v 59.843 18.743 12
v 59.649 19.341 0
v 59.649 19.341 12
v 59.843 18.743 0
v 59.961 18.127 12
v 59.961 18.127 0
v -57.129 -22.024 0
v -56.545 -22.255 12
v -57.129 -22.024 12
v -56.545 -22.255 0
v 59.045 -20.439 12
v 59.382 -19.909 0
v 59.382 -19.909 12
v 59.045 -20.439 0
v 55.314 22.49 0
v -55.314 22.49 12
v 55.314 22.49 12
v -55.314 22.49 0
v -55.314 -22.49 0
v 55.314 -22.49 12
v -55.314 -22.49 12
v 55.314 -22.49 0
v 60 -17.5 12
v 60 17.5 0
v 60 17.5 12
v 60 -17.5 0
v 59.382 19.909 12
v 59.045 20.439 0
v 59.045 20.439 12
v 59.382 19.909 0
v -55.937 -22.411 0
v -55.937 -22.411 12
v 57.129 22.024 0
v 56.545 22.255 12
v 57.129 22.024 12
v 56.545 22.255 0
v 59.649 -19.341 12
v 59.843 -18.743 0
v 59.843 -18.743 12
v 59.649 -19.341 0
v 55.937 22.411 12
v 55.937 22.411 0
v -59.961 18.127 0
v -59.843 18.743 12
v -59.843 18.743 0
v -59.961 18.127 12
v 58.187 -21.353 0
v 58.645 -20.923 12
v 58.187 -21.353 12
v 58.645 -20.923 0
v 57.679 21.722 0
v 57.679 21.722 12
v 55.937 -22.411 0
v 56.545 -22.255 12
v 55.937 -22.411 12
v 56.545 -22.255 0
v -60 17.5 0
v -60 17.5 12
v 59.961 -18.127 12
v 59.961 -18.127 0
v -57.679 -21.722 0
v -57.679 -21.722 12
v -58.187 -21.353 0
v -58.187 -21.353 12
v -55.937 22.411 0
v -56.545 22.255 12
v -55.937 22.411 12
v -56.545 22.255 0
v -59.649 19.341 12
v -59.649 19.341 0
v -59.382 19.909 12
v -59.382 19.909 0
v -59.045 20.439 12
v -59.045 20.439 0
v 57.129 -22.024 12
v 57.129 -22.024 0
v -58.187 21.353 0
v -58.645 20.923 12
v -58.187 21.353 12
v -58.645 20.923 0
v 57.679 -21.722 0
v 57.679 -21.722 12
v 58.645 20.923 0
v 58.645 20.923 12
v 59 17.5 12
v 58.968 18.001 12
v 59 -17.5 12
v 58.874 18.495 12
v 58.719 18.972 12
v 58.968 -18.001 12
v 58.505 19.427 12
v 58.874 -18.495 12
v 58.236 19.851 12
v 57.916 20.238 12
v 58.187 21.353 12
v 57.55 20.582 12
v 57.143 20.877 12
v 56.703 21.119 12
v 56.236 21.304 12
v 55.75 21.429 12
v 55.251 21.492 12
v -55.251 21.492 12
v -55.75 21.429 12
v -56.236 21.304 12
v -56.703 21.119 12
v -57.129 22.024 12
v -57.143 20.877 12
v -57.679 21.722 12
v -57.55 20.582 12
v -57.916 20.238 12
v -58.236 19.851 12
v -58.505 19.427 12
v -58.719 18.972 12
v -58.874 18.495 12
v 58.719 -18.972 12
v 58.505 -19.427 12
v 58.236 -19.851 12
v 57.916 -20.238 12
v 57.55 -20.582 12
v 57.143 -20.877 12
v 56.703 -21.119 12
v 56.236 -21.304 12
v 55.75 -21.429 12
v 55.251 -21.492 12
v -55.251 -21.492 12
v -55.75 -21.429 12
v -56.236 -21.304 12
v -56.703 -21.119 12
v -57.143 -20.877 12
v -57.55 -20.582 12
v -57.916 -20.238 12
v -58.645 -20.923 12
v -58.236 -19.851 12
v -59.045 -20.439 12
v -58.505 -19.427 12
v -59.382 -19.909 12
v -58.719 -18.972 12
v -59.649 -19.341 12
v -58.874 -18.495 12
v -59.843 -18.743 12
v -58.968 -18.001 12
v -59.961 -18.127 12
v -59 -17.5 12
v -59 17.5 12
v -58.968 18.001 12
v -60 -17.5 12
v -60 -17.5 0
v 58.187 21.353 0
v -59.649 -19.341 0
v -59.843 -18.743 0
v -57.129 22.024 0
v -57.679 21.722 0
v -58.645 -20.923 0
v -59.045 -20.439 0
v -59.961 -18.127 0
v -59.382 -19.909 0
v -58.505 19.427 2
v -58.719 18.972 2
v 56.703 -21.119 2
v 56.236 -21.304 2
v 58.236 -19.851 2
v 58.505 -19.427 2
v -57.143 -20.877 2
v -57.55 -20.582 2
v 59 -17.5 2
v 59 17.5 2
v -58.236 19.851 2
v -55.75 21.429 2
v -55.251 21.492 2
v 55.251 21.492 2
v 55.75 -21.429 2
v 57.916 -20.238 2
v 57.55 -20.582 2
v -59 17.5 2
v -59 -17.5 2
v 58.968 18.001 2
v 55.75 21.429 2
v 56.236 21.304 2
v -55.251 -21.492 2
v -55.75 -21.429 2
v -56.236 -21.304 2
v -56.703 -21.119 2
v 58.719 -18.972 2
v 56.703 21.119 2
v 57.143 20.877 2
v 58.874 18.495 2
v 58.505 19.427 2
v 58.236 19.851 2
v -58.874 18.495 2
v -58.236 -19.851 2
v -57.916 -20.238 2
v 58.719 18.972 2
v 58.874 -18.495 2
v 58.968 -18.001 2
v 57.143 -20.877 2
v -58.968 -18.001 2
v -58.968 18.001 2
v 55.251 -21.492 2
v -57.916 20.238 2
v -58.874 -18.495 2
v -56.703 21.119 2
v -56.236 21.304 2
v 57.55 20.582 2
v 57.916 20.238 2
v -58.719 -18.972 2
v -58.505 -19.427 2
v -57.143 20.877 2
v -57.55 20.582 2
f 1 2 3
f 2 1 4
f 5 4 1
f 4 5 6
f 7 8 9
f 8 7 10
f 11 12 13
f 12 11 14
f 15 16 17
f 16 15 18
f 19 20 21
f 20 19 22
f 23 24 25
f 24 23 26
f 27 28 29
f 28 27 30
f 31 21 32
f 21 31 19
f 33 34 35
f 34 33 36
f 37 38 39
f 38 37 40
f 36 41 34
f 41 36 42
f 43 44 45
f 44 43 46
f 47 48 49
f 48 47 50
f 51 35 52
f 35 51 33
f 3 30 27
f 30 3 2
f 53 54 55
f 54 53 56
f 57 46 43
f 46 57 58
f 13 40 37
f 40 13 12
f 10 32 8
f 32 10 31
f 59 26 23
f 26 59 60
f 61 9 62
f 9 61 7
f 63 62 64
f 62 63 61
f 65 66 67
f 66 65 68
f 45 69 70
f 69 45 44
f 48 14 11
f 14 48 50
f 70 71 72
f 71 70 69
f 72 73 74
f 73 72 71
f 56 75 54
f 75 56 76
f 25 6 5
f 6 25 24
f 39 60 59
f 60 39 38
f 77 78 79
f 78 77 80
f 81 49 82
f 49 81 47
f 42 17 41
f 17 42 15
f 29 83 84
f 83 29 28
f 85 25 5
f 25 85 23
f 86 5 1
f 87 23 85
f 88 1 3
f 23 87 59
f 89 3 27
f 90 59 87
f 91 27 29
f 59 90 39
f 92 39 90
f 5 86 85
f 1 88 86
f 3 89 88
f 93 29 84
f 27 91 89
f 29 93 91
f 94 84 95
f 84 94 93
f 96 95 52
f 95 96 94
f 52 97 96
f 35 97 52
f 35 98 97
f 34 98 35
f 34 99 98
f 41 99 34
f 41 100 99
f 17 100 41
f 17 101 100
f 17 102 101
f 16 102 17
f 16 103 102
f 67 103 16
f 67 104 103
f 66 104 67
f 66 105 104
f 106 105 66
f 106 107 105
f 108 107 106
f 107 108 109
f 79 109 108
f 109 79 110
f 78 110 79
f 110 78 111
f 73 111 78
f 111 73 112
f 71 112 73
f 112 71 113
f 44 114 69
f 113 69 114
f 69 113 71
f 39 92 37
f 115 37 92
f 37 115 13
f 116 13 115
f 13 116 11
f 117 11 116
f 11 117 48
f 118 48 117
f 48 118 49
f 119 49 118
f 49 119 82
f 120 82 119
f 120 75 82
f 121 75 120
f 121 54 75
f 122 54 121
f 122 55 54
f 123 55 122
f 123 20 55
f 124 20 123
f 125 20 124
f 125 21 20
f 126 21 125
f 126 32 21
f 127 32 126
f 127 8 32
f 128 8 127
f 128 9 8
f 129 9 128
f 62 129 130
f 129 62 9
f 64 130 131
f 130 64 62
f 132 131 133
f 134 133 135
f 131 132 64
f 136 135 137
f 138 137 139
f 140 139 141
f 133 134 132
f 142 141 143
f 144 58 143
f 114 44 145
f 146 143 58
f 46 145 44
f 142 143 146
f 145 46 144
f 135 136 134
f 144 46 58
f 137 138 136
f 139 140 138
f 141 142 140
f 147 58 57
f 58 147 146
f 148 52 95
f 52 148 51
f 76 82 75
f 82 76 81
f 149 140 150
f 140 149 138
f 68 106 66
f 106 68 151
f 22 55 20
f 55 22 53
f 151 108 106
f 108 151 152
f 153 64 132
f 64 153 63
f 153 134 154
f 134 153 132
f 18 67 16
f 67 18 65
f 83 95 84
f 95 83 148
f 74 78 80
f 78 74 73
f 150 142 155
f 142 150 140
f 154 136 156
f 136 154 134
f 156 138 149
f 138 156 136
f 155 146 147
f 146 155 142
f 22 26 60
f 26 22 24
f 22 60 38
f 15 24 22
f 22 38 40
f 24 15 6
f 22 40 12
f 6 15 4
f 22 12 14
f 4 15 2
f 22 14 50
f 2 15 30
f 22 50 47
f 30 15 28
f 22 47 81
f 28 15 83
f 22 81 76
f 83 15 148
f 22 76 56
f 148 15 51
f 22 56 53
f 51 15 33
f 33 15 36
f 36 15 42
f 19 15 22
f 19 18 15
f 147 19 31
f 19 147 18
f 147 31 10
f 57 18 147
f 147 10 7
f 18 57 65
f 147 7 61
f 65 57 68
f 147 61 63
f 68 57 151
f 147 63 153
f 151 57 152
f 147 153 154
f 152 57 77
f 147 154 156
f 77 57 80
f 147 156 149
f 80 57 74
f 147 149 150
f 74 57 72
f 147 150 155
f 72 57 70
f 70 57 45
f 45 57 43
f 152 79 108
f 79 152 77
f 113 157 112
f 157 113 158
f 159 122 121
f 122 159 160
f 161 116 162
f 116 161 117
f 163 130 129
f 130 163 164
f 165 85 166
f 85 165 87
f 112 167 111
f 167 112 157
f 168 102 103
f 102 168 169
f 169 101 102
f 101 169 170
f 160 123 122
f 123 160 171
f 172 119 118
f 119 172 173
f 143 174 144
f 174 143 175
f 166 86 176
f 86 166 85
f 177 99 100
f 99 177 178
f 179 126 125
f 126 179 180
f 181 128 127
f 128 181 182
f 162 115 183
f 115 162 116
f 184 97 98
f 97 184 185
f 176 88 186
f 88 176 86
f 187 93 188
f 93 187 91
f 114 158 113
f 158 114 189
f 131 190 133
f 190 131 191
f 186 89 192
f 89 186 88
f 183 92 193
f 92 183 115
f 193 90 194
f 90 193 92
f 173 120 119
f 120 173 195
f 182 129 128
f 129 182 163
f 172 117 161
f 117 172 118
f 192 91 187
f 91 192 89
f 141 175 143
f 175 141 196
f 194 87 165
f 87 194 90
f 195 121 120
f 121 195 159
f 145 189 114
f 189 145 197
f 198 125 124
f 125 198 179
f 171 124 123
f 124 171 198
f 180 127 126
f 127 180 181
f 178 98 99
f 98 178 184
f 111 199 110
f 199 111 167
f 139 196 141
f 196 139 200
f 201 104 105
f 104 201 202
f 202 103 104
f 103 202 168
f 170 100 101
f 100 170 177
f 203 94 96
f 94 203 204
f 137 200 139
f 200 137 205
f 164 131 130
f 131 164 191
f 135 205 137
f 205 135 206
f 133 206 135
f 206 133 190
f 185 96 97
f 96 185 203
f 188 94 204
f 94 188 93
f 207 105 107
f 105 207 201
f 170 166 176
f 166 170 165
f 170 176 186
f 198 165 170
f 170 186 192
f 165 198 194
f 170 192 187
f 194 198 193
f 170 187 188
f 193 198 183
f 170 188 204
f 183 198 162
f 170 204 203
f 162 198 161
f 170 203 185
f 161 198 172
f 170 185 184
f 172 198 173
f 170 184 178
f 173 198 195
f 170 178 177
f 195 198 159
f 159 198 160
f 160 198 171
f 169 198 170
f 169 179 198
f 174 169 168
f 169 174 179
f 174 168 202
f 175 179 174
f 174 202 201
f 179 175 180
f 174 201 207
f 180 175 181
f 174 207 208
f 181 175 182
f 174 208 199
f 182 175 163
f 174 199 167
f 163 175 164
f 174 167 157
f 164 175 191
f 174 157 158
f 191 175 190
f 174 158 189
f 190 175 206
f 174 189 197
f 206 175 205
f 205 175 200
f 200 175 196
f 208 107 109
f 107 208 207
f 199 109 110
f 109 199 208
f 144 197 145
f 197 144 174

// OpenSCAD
$fn = 50;


difference() {
	union() {
		hull() {
			translate(v = [-55.0000000000, 17.5000000000, 0]) {
				cylinder(h = 12, r = 5);
			}
			translate(v = [55.0000000000, 17.5000000000, 0]) {
				cylinder(h = 12, r = 5);
			}
			translate(v = [-55.0000000000, -17.5000000000, 0]) {
				cylinder(h = 12, r = 5);
			}
			translate(v = [55.0000000000, -17.5000000000, 0]) {
				cylinder(h = 12, r = 5);
			}
		}
	}
	union() {
		translate(v = [0, 0, 2]) {
			hull() {
				translate(v = [-55.0000000000, 17.5000000000, 0]) {
					cylinder(h = 10, r = 4);
				}
				translate(v = [55.0000000000, 17.5000000000, 0]) {
					cylinder(h = 10, r = 4);
				}
				translate(v = [-55.0000000000, -17.5000000000, 0]) {
					cylinder(h = 10, r = 4);
				}
				translate(v = [55.0000000000, -17.5000000000, 0]) {
					cylinder(h = 10, r = 4);
				}
			}
		}
	}
}
